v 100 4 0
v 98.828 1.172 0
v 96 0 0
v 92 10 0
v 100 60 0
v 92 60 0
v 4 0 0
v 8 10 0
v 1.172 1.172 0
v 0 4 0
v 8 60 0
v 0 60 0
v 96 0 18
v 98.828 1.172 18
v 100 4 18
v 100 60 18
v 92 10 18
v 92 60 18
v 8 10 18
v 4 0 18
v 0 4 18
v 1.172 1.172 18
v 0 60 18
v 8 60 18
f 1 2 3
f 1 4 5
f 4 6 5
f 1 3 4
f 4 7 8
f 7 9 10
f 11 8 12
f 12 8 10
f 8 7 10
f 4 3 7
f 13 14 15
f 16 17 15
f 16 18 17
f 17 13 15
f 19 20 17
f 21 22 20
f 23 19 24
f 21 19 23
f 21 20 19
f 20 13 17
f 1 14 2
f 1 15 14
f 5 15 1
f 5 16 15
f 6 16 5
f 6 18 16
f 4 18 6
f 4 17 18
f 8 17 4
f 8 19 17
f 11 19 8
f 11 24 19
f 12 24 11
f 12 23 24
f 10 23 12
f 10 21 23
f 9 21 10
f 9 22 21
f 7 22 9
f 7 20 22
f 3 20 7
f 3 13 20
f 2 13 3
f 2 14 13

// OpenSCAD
$fn = 32;

// ----------------------------------------------------------------------
// Heat sink frame: 100 x 60 mm frame, 8 mm walls
// ----------------------------------------------------------------------

// --- parameters (mm) ---
profile_height = 18;      // extrusion height
profile_points = 12;      // points of the closed outline

profile = [[0, 4], [1.172, 1.172], [4, 0], [96, 0], [98.828, 1.172], [100, 4], [100, 60], [92, 60], [92, 10], [8, 10], [8, 60], [0, 60]];  // single closed polygon, 12 points, counter clockwise

// --- the one profile operation ---
linear_extrude(height = profile_height) polygon(points = profile);
